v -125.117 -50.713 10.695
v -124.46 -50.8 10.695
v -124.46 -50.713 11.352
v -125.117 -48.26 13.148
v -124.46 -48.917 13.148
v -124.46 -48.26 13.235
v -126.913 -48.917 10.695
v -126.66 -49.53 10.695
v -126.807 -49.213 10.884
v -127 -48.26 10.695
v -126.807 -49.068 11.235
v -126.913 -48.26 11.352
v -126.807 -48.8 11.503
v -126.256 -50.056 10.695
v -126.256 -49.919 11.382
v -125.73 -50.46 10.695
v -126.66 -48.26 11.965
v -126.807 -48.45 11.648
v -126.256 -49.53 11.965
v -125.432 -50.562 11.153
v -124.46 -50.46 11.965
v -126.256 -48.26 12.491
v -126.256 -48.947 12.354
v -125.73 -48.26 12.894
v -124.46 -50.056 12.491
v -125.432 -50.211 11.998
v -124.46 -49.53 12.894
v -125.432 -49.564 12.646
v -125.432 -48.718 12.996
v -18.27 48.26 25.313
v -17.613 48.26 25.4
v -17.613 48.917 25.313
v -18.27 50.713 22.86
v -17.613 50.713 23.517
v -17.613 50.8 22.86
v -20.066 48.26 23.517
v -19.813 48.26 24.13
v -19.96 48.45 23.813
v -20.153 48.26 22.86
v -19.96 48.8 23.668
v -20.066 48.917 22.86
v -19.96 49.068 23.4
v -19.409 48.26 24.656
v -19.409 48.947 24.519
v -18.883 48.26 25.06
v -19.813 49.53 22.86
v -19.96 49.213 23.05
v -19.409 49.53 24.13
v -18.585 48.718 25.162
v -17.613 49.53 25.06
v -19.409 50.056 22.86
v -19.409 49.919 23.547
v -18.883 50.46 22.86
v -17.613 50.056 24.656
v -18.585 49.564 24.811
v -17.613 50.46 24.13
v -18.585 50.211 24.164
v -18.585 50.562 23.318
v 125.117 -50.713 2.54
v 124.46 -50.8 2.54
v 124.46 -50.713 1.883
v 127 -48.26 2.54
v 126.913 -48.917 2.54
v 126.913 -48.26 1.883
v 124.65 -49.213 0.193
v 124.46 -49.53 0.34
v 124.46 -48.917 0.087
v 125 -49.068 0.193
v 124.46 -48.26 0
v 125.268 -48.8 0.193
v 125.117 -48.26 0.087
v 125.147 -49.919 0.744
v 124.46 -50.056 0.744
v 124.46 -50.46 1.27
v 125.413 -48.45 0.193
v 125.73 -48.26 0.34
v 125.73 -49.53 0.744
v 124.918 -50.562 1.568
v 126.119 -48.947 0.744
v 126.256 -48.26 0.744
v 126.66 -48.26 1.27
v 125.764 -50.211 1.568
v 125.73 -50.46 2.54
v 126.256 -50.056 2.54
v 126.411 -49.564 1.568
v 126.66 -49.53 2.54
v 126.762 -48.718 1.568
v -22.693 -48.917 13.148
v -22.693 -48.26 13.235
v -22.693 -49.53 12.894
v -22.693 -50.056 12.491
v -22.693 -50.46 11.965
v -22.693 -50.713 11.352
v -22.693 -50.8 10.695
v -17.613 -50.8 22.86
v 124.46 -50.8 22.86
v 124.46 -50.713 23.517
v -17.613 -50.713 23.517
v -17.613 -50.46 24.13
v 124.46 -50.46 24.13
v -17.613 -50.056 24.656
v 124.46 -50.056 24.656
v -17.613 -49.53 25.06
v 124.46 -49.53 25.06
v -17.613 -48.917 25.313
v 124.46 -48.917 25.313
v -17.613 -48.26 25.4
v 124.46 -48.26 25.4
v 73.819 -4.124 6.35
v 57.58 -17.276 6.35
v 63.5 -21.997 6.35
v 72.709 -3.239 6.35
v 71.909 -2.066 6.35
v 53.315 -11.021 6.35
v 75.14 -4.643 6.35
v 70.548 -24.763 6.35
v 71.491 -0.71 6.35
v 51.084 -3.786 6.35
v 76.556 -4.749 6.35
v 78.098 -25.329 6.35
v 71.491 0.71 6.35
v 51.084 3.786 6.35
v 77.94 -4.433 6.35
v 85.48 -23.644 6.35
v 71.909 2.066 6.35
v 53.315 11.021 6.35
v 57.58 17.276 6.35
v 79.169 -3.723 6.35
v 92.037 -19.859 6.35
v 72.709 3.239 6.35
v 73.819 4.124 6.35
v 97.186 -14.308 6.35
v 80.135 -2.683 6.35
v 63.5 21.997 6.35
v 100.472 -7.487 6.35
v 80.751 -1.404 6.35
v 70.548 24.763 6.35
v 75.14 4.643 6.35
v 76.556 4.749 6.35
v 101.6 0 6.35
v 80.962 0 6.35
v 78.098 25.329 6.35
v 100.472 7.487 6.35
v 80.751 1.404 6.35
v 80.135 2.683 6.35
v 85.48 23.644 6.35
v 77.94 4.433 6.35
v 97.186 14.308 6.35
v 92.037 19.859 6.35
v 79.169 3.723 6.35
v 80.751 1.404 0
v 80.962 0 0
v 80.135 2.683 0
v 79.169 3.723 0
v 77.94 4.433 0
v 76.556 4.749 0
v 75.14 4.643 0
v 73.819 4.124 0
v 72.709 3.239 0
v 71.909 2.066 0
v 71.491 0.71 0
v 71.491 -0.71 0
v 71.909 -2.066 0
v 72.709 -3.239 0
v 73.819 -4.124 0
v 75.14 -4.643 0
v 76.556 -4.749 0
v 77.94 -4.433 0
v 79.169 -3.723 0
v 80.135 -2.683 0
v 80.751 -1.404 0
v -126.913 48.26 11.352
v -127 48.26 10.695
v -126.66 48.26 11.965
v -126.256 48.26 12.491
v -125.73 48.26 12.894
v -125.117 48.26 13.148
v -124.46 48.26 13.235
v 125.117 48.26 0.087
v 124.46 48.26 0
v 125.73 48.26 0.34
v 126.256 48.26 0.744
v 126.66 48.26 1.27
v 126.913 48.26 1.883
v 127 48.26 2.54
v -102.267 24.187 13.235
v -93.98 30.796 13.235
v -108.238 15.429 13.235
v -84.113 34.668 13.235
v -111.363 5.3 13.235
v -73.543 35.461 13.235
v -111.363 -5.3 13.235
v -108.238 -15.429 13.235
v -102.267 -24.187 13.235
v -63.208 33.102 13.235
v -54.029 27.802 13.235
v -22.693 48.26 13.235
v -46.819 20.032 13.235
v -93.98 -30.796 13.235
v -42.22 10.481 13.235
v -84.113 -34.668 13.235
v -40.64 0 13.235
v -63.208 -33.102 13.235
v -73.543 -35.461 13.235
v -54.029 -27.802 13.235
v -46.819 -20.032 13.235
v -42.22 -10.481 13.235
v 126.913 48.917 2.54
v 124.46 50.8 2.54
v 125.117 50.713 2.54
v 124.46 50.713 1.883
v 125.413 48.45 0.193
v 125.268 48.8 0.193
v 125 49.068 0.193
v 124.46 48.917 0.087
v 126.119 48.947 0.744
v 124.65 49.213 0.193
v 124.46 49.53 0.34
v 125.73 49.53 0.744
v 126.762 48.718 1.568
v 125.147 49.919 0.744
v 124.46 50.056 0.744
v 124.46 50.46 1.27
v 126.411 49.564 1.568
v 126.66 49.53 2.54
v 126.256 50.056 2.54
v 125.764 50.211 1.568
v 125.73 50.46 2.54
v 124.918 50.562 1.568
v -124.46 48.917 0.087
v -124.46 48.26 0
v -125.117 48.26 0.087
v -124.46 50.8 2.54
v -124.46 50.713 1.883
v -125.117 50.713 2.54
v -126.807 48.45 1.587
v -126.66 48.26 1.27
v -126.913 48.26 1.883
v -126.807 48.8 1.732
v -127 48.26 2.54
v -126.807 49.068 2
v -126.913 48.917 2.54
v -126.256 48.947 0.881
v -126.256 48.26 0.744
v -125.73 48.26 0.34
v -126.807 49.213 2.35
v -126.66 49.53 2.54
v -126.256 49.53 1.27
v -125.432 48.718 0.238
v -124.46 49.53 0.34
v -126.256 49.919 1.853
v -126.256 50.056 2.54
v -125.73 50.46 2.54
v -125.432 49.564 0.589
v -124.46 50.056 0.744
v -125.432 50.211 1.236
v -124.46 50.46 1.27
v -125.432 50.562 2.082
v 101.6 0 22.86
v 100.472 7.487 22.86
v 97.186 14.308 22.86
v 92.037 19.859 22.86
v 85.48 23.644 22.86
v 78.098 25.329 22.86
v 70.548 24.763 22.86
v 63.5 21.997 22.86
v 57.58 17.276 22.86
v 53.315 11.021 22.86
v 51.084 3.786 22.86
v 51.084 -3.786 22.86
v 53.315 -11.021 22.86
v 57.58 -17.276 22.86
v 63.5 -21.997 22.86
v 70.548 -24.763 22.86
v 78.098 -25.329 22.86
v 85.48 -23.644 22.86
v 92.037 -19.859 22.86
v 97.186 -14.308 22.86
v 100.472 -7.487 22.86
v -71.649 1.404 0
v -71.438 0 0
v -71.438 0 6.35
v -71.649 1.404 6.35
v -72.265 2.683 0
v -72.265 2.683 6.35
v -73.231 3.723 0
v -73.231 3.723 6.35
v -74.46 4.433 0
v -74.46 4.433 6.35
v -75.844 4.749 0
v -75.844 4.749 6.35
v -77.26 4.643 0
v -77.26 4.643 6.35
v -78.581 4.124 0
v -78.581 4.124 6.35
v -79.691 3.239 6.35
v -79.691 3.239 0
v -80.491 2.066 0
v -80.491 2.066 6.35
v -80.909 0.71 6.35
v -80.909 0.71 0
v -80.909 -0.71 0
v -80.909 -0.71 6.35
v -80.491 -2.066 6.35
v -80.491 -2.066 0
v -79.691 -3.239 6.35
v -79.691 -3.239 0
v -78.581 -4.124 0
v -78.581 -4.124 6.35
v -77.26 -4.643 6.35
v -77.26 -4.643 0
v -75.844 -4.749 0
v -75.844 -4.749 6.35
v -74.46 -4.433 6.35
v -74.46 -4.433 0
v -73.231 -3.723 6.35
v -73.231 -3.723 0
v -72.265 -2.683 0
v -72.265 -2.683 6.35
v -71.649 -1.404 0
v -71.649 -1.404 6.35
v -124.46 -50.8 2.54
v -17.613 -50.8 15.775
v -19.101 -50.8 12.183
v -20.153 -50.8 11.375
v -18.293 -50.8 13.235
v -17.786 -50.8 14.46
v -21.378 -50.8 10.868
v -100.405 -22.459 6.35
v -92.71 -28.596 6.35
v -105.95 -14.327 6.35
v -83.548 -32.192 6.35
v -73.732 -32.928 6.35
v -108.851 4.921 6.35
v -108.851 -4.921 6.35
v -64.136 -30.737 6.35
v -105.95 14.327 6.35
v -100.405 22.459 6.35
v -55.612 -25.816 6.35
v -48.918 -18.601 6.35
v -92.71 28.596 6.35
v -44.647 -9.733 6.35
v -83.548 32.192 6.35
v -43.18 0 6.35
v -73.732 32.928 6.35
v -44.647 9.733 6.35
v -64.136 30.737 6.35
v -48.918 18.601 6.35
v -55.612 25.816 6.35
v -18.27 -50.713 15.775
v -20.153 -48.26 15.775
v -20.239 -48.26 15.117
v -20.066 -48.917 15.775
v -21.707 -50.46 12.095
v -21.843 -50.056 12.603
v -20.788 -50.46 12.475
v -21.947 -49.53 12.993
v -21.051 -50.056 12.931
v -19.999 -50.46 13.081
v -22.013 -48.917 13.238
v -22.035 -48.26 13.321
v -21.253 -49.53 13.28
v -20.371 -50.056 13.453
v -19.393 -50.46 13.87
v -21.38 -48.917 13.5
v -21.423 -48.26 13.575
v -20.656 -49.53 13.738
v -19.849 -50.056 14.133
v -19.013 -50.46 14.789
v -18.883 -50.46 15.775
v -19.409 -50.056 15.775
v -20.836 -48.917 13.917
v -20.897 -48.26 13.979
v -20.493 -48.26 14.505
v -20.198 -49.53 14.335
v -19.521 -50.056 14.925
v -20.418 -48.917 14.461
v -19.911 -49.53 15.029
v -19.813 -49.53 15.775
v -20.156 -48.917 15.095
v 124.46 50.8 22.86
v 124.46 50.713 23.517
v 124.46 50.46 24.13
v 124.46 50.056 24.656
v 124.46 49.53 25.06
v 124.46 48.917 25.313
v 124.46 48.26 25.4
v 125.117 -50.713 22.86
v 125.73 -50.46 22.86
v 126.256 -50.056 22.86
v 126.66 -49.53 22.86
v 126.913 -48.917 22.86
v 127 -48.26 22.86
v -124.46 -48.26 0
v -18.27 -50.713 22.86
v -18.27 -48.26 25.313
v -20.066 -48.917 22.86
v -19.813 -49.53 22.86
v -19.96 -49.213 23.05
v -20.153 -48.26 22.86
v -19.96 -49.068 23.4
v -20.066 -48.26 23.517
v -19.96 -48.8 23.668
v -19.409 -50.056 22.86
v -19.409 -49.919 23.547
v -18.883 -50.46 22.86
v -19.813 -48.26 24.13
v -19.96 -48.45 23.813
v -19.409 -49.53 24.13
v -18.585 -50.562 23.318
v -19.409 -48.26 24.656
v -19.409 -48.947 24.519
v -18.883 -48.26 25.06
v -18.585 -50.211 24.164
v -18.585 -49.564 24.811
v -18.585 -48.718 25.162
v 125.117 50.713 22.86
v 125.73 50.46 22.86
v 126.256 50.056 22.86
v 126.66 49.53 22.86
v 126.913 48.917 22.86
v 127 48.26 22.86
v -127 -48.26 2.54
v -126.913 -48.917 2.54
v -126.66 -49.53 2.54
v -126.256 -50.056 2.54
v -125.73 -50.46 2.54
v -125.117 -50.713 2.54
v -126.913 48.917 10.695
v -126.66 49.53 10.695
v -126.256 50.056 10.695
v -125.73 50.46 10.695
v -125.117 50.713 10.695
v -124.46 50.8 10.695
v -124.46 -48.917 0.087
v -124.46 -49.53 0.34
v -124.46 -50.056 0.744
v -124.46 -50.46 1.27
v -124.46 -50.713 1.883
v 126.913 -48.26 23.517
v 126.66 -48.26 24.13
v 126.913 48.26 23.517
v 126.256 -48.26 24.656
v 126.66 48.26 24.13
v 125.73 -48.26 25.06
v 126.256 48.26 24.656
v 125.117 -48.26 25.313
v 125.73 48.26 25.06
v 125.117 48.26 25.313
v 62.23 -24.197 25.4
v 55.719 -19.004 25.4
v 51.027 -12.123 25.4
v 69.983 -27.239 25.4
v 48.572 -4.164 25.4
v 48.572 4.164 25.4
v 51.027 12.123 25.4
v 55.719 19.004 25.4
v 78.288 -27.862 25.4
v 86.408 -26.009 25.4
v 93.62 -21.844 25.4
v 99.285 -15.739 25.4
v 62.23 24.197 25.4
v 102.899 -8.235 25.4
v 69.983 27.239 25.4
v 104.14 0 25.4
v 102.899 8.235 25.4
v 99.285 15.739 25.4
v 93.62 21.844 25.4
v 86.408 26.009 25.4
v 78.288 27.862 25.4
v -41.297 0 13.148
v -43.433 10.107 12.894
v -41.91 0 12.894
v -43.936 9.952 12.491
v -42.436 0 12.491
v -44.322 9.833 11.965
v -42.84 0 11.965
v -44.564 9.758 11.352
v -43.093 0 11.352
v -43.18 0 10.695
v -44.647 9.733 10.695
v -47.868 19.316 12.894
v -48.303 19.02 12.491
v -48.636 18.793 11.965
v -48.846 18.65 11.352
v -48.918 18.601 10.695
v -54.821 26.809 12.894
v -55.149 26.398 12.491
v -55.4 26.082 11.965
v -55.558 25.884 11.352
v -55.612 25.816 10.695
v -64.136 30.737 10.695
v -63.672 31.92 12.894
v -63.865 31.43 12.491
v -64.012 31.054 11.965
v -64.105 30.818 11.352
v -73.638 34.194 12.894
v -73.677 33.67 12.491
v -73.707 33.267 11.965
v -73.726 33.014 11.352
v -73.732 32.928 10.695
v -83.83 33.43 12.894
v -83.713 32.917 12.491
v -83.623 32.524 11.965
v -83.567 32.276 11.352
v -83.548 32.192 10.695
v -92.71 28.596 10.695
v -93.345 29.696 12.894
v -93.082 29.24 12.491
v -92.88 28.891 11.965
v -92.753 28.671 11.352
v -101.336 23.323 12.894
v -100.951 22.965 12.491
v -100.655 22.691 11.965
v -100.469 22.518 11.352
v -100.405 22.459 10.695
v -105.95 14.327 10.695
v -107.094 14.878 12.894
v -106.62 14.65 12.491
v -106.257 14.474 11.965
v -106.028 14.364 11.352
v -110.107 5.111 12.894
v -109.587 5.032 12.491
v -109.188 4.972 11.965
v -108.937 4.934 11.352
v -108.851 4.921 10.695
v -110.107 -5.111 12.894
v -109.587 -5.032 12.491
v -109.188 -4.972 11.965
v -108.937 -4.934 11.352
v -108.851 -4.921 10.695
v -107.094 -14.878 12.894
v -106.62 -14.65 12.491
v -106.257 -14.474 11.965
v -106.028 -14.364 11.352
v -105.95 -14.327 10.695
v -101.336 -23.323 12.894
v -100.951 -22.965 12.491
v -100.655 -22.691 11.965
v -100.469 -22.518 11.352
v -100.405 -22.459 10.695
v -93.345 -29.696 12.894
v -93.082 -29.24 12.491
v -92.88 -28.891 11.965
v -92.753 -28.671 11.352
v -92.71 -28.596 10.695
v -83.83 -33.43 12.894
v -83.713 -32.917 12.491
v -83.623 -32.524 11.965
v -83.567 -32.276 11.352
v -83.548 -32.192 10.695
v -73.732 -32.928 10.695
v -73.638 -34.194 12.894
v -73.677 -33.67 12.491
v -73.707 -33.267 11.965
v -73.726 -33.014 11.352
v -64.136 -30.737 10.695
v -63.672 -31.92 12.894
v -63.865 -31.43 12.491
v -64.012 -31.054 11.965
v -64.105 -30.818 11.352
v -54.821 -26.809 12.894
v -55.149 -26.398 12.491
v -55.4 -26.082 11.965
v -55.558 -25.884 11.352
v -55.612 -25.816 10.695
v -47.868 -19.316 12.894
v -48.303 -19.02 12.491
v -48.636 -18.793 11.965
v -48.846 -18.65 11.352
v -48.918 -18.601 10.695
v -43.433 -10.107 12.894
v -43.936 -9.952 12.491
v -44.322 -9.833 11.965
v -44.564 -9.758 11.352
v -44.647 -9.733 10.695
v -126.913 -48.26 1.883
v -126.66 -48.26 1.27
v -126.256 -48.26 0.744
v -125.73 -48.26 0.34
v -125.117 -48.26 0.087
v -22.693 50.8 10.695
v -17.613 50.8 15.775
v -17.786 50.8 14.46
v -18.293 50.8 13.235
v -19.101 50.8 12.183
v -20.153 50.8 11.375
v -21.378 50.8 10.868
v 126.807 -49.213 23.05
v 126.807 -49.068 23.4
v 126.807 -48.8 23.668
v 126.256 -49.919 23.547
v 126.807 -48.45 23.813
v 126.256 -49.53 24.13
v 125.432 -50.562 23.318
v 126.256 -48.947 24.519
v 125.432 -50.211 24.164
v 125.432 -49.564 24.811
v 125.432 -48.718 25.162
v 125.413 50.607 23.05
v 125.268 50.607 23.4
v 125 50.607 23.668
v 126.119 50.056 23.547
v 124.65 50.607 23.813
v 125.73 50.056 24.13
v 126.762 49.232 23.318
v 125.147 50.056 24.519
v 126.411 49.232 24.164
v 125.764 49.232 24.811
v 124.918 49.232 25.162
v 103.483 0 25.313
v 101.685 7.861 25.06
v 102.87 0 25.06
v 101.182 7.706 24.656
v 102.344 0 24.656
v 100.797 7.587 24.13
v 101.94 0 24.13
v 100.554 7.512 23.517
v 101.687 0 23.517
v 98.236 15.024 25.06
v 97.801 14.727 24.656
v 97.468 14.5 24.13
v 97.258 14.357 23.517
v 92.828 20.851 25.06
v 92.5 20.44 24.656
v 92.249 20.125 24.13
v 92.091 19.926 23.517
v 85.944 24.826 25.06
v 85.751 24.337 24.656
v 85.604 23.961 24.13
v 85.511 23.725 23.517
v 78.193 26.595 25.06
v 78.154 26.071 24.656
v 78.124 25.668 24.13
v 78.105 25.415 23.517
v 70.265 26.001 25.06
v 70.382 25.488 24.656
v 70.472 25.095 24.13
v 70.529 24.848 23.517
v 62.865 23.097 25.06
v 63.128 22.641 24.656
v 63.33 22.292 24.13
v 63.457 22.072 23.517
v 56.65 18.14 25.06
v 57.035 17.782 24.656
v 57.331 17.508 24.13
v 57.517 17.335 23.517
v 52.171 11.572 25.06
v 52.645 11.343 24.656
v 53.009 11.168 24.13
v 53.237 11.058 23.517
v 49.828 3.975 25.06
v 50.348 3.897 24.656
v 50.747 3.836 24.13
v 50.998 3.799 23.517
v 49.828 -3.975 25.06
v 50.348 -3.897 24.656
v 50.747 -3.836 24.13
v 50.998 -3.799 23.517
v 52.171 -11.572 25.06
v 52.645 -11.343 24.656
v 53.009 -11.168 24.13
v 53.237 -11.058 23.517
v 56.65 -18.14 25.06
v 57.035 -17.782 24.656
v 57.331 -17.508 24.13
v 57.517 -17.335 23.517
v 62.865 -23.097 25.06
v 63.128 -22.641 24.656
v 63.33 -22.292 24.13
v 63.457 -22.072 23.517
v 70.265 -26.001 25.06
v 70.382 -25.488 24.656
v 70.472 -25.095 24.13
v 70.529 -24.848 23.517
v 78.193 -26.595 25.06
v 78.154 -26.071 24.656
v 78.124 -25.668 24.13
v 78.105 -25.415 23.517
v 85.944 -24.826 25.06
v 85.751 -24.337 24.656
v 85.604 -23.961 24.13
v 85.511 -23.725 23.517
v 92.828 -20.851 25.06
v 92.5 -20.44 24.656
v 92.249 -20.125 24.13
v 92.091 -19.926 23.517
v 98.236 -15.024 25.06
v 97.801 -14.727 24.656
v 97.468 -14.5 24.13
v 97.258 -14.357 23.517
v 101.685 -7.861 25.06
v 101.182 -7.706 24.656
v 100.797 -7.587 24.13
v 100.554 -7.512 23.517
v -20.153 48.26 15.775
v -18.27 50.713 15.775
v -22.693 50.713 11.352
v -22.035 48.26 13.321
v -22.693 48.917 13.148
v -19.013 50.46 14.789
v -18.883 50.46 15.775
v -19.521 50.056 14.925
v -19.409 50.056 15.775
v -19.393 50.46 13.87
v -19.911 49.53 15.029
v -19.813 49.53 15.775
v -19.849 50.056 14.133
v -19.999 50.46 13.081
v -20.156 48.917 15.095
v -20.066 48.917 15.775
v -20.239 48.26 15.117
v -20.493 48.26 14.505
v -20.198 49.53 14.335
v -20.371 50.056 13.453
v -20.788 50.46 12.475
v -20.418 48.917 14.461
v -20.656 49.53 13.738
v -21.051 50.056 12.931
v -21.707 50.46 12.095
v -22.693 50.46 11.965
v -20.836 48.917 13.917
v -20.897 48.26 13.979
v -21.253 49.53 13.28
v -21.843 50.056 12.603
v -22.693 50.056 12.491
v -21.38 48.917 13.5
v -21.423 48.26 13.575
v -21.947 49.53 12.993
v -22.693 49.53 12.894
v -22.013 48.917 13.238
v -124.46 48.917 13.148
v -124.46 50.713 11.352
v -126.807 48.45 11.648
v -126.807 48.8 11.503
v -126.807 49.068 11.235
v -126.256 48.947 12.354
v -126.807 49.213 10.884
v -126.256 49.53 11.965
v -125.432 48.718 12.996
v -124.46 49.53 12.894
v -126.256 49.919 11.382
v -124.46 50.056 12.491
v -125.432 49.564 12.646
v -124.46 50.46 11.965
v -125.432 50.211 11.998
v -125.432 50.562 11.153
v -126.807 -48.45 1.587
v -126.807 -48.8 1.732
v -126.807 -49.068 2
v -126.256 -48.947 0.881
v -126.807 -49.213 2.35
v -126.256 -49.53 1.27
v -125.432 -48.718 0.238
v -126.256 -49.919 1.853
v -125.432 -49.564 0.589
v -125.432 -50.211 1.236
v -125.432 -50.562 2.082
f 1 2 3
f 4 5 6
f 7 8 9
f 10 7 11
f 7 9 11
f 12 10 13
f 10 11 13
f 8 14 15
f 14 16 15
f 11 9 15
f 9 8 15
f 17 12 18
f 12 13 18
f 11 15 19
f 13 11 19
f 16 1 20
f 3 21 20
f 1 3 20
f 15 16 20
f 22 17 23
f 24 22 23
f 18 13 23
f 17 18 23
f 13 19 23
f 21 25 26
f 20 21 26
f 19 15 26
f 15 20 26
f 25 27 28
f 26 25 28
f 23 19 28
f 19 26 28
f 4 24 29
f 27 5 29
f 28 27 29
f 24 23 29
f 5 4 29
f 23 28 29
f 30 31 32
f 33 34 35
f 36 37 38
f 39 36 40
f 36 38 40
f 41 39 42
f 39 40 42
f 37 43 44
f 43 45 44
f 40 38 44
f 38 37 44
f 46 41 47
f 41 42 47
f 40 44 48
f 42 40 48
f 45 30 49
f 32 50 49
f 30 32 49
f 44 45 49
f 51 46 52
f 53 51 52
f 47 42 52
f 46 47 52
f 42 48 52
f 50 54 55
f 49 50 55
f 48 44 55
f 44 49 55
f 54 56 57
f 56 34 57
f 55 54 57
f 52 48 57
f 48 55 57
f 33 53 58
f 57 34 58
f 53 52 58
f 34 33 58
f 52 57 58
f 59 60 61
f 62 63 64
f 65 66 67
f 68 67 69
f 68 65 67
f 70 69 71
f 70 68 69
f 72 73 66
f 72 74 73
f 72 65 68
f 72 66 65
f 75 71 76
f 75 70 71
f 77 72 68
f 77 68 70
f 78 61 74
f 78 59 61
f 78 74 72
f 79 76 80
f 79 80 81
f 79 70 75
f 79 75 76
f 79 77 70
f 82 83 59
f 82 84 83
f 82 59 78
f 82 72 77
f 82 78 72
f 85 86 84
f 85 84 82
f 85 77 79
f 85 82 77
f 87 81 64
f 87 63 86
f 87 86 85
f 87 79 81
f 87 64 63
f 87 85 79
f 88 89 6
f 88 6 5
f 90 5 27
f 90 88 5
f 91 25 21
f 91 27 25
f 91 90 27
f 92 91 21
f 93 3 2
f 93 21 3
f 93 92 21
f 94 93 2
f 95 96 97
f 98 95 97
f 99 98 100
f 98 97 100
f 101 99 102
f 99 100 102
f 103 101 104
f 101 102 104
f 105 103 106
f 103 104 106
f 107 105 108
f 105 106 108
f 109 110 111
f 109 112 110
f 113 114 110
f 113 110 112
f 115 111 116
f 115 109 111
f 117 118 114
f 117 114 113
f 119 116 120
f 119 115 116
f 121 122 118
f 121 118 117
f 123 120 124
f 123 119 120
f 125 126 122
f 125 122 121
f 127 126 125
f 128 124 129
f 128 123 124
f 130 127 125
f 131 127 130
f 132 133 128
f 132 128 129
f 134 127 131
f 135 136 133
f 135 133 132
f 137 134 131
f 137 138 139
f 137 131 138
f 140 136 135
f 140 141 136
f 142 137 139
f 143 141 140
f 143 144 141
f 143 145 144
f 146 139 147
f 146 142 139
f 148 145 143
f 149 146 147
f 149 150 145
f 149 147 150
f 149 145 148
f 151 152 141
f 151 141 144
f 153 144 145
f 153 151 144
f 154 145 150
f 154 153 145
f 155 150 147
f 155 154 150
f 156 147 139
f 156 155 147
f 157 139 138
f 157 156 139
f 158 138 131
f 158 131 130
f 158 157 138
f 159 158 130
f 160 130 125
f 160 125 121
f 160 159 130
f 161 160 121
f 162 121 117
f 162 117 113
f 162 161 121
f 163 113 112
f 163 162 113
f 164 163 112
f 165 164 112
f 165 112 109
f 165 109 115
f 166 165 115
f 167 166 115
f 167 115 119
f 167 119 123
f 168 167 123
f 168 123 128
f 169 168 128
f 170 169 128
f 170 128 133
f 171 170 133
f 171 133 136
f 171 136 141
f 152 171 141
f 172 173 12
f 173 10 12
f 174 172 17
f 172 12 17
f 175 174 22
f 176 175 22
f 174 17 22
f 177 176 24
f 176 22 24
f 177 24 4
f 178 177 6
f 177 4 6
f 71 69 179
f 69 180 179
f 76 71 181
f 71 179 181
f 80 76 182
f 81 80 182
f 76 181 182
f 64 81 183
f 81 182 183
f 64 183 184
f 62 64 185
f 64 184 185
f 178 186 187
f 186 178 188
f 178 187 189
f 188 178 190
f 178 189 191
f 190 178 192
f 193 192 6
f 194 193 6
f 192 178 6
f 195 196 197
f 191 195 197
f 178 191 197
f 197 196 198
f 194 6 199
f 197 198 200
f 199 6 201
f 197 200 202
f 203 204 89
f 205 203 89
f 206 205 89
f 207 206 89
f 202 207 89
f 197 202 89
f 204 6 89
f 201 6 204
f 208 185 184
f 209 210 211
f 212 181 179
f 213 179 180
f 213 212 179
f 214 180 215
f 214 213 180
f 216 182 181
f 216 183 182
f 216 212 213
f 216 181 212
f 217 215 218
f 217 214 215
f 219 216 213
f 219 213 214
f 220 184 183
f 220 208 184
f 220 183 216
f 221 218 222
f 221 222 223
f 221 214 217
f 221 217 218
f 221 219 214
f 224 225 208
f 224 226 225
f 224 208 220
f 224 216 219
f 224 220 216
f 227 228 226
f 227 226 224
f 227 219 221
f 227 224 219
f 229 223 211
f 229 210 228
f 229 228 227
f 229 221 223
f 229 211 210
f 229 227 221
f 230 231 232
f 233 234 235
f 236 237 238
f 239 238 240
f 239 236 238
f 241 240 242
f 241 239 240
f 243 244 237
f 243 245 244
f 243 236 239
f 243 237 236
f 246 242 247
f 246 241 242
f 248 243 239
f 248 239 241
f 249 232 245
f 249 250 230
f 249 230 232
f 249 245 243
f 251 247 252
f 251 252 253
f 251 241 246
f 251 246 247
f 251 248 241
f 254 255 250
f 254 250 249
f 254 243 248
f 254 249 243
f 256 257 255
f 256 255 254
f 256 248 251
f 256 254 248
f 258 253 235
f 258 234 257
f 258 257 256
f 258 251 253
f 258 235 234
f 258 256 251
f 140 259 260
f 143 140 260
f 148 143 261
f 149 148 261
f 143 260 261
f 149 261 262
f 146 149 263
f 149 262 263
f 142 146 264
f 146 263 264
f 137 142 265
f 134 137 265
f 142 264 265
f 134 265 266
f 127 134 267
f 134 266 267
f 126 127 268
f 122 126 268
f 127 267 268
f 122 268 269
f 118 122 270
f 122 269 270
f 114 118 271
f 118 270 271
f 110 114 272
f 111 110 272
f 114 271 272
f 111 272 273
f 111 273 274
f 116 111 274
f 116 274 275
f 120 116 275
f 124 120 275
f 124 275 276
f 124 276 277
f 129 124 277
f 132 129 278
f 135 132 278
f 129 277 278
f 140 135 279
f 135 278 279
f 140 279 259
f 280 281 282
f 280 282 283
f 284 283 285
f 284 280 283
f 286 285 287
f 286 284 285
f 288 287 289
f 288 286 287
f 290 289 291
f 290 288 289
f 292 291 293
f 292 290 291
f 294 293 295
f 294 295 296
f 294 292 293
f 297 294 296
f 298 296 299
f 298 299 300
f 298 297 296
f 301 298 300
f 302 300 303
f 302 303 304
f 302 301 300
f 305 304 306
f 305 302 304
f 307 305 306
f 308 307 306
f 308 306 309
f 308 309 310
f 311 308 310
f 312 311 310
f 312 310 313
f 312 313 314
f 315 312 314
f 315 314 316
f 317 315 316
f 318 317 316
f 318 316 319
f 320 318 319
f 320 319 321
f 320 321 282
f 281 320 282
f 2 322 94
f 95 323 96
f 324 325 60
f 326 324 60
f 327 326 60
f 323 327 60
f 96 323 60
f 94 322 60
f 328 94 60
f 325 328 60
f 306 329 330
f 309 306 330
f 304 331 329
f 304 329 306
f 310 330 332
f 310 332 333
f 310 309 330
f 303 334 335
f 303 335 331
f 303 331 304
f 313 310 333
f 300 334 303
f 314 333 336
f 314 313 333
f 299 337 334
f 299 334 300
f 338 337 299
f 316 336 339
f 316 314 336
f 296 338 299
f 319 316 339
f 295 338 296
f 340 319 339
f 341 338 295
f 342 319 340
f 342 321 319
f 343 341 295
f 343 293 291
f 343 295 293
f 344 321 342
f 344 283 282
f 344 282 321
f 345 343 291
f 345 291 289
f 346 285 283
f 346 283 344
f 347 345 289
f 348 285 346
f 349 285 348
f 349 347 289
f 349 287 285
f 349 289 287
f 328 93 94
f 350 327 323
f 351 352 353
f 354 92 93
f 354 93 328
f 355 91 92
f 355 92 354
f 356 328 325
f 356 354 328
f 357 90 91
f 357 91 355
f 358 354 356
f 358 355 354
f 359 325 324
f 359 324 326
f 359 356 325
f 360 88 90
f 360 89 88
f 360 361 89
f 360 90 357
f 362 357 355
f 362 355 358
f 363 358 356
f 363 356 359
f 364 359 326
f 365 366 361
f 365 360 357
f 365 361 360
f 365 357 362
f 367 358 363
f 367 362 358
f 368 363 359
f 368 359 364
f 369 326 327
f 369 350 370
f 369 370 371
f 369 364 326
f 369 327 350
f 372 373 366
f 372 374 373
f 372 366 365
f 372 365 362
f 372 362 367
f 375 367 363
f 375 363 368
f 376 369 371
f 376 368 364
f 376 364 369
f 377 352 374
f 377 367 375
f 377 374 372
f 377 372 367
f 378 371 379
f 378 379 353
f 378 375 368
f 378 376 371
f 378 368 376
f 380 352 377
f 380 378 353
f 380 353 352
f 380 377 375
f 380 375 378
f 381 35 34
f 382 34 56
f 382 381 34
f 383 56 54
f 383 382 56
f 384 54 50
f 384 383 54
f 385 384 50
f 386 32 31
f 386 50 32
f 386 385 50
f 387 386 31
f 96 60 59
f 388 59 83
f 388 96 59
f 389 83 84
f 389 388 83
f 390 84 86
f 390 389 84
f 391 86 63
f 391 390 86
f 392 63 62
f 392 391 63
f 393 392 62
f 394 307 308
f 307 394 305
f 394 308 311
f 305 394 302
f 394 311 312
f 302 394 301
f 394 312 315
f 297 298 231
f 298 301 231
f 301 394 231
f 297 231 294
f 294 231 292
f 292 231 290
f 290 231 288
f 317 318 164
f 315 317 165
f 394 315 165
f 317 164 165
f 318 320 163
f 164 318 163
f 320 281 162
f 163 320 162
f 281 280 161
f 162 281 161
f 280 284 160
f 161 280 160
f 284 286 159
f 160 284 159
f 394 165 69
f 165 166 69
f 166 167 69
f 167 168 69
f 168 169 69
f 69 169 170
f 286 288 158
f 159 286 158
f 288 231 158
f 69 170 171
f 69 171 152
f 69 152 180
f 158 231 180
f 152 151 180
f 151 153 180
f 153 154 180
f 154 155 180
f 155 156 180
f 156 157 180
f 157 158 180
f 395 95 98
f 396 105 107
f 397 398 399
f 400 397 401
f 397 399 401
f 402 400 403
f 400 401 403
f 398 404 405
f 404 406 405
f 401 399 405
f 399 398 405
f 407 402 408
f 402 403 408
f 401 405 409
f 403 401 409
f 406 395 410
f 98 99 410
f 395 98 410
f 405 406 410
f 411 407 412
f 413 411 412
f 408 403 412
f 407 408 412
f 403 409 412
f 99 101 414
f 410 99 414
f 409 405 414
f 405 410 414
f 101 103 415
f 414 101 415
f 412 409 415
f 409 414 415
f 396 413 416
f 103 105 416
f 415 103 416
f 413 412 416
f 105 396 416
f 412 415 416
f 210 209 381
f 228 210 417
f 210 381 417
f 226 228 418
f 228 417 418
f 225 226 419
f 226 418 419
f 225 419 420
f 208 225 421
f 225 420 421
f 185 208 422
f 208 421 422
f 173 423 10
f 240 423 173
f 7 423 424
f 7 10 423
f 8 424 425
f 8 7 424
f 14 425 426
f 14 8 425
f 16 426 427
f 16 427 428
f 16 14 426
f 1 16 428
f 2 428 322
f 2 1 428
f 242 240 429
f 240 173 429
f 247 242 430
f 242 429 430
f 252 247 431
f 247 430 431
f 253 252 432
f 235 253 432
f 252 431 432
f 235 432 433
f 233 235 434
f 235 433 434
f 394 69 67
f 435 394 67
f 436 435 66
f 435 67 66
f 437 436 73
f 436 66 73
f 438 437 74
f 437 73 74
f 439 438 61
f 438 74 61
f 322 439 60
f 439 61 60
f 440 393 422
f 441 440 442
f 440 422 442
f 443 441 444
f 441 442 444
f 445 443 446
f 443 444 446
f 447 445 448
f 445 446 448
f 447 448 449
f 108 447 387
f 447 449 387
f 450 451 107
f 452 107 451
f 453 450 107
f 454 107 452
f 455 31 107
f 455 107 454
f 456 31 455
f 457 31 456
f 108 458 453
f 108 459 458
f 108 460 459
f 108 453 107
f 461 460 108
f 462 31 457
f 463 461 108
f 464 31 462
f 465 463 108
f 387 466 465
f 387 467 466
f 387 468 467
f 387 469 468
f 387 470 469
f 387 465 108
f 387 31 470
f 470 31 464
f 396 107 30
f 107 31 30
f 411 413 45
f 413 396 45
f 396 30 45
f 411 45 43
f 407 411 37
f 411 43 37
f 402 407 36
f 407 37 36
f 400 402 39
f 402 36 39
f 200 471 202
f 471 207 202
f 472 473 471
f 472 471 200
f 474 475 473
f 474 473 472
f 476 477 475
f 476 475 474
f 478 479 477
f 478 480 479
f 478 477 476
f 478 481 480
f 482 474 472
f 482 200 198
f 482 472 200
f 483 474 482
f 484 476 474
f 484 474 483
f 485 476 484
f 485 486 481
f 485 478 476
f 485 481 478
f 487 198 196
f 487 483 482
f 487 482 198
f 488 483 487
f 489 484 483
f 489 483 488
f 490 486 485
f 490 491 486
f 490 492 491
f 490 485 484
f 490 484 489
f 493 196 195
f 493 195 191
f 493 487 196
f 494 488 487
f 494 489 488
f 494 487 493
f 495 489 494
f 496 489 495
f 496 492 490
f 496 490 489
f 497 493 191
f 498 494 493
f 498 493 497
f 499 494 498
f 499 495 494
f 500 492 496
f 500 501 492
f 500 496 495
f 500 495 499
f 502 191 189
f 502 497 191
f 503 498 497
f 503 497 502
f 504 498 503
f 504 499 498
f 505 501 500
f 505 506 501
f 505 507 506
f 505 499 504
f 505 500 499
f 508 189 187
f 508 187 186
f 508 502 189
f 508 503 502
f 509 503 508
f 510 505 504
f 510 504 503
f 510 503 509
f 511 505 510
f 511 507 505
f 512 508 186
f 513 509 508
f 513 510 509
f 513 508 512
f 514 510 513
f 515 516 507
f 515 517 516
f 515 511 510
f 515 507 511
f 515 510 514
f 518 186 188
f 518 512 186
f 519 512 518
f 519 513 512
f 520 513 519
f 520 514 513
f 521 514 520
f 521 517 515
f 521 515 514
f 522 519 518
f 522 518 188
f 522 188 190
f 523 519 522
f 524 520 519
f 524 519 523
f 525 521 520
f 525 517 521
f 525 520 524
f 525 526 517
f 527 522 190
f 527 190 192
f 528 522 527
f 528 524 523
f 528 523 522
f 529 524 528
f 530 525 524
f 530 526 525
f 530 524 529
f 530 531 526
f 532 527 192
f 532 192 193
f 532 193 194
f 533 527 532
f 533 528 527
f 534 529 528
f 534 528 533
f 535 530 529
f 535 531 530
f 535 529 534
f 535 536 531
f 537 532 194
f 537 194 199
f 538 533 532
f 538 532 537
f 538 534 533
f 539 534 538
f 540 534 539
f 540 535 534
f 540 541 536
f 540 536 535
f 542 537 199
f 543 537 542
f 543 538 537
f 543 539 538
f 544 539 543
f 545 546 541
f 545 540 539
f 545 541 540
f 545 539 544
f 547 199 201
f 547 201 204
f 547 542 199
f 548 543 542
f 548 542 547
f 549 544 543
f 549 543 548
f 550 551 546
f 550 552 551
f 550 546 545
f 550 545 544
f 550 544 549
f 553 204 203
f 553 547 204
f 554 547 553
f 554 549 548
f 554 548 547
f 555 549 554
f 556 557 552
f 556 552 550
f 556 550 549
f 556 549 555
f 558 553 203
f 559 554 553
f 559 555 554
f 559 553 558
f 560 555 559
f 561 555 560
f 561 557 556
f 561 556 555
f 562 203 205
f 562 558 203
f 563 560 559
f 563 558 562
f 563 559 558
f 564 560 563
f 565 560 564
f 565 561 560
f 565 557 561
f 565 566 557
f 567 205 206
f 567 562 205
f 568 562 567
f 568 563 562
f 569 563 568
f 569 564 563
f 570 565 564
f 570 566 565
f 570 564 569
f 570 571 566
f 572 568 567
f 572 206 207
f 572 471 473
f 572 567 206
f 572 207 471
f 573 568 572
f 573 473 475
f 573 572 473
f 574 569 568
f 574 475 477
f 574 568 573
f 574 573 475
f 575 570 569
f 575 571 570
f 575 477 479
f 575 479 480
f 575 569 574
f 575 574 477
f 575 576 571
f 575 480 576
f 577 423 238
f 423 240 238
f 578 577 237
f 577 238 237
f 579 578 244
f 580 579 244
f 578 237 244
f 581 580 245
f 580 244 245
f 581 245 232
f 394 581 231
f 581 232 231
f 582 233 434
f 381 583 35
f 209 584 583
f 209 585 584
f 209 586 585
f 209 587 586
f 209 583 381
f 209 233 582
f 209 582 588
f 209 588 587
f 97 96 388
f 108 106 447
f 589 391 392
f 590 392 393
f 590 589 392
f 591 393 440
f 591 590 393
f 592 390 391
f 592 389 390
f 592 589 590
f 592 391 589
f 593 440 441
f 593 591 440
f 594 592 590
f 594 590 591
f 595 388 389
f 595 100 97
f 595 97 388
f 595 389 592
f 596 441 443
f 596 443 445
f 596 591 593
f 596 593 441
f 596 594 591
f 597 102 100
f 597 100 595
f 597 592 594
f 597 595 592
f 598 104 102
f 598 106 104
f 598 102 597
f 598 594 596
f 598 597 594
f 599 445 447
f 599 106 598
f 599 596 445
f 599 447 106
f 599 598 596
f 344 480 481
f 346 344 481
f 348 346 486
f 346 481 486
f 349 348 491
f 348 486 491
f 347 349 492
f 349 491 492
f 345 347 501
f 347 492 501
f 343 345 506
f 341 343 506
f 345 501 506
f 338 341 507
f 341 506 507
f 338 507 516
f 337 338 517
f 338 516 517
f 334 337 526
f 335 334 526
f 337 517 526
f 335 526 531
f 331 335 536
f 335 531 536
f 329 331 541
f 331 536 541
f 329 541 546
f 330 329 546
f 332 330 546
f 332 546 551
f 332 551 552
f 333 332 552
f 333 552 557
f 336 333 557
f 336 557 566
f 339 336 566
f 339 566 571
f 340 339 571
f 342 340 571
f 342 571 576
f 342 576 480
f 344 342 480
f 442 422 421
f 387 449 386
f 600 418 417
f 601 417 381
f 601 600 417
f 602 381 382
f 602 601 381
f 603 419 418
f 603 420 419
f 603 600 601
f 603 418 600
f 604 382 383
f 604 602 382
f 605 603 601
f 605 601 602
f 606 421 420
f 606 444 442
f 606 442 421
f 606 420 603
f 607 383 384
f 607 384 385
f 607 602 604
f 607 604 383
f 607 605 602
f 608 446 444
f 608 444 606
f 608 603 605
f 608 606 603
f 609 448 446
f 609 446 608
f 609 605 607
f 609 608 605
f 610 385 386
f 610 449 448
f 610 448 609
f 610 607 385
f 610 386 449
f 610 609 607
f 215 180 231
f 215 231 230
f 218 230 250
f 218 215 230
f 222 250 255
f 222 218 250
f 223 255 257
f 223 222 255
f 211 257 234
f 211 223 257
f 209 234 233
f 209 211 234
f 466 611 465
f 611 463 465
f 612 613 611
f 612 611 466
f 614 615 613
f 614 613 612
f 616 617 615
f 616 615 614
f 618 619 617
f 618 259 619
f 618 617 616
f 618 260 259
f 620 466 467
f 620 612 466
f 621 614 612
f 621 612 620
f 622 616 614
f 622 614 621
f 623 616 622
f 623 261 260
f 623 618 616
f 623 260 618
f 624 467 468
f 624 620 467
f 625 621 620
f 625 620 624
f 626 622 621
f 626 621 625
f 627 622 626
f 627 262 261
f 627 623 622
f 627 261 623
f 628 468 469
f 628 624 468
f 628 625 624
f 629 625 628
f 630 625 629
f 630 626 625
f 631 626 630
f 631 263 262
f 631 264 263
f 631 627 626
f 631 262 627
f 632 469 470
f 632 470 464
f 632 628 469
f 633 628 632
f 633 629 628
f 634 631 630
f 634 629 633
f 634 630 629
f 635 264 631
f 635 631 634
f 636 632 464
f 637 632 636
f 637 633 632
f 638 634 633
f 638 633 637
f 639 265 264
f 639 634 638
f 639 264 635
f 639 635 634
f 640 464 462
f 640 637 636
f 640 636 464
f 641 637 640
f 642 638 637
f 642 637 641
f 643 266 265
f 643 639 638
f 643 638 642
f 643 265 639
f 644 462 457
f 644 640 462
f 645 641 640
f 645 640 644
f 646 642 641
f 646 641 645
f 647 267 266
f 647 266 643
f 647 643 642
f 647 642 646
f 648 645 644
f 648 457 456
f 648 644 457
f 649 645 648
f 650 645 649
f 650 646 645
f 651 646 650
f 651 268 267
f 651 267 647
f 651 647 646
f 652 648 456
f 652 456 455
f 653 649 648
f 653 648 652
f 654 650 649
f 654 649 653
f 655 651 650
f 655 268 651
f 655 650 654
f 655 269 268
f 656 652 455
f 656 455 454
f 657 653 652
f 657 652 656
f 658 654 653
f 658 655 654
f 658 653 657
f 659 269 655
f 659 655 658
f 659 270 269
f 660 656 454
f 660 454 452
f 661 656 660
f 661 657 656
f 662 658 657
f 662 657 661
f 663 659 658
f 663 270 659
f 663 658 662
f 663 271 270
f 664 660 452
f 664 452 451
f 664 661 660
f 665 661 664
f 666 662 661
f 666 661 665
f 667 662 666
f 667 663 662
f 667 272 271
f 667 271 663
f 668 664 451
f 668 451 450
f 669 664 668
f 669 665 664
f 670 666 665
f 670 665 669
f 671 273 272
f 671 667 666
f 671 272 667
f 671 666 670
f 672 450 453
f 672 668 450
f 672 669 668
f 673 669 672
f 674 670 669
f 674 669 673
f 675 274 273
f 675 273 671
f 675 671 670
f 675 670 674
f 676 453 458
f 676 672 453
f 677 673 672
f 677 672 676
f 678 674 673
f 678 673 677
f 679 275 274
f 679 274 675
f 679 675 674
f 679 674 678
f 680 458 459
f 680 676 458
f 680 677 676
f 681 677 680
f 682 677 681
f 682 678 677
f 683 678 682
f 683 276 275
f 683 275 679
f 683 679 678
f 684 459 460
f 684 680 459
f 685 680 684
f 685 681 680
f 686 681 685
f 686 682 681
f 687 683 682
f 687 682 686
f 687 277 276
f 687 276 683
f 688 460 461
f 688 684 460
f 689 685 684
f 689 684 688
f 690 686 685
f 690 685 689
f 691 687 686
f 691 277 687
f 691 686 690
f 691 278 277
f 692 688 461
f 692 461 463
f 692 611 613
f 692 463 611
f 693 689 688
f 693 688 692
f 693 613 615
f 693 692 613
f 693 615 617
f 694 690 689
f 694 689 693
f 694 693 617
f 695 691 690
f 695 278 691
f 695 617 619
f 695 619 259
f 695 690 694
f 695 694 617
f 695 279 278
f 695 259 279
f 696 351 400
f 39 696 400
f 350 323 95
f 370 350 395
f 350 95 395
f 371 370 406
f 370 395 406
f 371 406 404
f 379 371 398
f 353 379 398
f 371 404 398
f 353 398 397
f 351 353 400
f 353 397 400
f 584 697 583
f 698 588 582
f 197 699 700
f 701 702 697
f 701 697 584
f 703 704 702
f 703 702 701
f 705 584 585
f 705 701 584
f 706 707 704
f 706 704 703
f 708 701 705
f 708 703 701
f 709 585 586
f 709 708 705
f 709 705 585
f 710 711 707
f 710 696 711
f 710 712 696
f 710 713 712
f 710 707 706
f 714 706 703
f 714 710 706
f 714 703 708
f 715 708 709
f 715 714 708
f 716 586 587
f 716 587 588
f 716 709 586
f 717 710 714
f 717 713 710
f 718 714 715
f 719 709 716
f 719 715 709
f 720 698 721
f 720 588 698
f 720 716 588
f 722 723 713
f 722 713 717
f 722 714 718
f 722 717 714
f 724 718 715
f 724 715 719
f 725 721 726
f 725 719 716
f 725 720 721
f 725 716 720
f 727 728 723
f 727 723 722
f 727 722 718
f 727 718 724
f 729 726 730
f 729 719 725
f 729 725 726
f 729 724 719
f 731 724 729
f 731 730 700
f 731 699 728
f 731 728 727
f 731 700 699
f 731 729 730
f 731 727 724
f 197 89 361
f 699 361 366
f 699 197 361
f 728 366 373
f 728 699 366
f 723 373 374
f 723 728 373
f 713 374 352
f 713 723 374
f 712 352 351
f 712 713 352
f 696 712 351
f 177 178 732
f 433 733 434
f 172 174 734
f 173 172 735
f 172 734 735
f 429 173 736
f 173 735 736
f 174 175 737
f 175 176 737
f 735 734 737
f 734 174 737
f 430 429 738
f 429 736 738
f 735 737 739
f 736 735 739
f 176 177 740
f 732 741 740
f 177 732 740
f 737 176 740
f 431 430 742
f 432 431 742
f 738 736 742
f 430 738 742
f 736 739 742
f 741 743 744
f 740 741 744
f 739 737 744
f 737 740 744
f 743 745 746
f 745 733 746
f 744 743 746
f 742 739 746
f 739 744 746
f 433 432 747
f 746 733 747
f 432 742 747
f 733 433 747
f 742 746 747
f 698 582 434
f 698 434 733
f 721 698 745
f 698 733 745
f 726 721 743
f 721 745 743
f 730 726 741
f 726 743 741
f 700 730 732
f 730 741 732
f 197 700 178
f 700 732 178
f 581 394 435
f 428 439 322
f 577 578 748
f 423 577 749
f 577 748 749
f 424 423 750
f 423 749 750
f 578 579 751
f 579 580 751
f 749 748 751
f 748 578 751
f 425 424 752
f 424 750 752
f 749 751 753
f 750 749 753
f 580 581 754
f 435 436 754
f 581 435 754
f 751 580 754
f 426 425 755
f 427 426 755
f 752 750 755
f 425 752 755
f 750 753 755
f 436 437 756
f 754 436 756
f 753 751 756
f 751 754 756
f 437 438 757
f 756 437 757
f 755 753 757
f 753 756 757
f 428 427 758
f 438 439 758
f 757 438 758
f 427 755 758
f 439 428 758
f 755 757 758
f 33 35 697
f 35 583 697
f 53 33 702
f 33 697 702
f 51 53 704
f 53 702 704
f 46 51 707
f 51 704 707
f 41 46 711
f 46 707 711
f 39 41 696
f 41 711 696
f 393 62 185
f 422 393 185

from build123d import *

# Parameters (mm, degrees)
F0_W     = 254
F0_H     = 101.6
F0_R     = 4.7625
F1_DEPTH = 25.4
F2_R     = 33.02
F2_R_2   = 4.7625
F2_R_3   = 25.4
F3_DEPTH = 19.05
F4_W     = 106.8471033573
F4_H     = 12.1652636021
F5_DEPTH = 101.601
F6_R     = 2.54


with BuildPart() as f1:
    # F0 (on Top) → F1 (new body)
    with BuildSketch(Plane.XY):
        Rectangle(F0_W, F0_H)
        with Locations((-76.2, 0)):
            Circle(F0_R, mode=Mode.SUBTRACT)
        with Locations((76.2, 0)):
            Circle(F0_R, mode=Mode.SUBTRACT)
    extrude(amount=F1_DEPTH)

    # F2 (on face) → F3 (cut)
    with BuildSketch(Plane.XY.offset(25.4)):
        with Locations((-76.2, 0)):
            Circle(F2_R)
        with Locations((-76.2, 0)):
            Circle(F2_R_2, mode=Mode.SUBTRACT)
        with Locations((76.2, 0)):
            Circle(F2_R_3)
        with Locations((76.2, 0)):
            Circle(F2_R_2, mode=Mode.SUBTRACT)
    extrude(amount=-F3_DEPTH, mode=Mode.SUBTRACT)

    # F4 (on face) → F5 (cut, through all)
    with BuildSketch(Plane.XZ.offset(50.8)):
        Polygon((-138.9647424221, 56.2476329505), (-157.312899828, 13.2347363979), (-127, 13.2347363979), (-127, 25.4), (-20.1528966427, 25.4), (-20.1528966427, 66.1736875772), align=None)
        with Locations((-73.5764483213, 19.3173681989)):
            Rectangle(F4_W, F4_H)
    extrude(amount=-F5_DEPTH, mode=Mode.SUBTRACT)

    # F6
    f6_edges = [f1.edges().sort_by_distance(p)[0] for p in [
        (-73.576448, -50.8, 13.234736),
        (53.423552, -50.8, 25.4),
        (-20.152897, -50.8, 19.317368),
        (127, -50.8, 12.7),
        (0, -50.8, 0),
        (127, 0, 25.4),
        (127, 50.8, 12.7),
        (127, 0, 0),
        (53.423552, 50.8, 25.4),
        (-20.152897, 0, 25.4),
        (50.8, 0, 25.4),
        (-109.22, 0, 13.234736),
        (-20.152897, 50.8, 19.317368),
        (-73.576448, 50.8, 13.234736),
        (0, 50.8, 0),
        (-127, 0, 0),
        (-127, -50.8, 6.617368),
        (-127, 0, 13.234736),
        (-127, 50.8, 6.617368),
        (-20.152897, 0, 13.234736),
    ]]
    fillet(f6_edges, radius=F6_R)


solid = f1.part
